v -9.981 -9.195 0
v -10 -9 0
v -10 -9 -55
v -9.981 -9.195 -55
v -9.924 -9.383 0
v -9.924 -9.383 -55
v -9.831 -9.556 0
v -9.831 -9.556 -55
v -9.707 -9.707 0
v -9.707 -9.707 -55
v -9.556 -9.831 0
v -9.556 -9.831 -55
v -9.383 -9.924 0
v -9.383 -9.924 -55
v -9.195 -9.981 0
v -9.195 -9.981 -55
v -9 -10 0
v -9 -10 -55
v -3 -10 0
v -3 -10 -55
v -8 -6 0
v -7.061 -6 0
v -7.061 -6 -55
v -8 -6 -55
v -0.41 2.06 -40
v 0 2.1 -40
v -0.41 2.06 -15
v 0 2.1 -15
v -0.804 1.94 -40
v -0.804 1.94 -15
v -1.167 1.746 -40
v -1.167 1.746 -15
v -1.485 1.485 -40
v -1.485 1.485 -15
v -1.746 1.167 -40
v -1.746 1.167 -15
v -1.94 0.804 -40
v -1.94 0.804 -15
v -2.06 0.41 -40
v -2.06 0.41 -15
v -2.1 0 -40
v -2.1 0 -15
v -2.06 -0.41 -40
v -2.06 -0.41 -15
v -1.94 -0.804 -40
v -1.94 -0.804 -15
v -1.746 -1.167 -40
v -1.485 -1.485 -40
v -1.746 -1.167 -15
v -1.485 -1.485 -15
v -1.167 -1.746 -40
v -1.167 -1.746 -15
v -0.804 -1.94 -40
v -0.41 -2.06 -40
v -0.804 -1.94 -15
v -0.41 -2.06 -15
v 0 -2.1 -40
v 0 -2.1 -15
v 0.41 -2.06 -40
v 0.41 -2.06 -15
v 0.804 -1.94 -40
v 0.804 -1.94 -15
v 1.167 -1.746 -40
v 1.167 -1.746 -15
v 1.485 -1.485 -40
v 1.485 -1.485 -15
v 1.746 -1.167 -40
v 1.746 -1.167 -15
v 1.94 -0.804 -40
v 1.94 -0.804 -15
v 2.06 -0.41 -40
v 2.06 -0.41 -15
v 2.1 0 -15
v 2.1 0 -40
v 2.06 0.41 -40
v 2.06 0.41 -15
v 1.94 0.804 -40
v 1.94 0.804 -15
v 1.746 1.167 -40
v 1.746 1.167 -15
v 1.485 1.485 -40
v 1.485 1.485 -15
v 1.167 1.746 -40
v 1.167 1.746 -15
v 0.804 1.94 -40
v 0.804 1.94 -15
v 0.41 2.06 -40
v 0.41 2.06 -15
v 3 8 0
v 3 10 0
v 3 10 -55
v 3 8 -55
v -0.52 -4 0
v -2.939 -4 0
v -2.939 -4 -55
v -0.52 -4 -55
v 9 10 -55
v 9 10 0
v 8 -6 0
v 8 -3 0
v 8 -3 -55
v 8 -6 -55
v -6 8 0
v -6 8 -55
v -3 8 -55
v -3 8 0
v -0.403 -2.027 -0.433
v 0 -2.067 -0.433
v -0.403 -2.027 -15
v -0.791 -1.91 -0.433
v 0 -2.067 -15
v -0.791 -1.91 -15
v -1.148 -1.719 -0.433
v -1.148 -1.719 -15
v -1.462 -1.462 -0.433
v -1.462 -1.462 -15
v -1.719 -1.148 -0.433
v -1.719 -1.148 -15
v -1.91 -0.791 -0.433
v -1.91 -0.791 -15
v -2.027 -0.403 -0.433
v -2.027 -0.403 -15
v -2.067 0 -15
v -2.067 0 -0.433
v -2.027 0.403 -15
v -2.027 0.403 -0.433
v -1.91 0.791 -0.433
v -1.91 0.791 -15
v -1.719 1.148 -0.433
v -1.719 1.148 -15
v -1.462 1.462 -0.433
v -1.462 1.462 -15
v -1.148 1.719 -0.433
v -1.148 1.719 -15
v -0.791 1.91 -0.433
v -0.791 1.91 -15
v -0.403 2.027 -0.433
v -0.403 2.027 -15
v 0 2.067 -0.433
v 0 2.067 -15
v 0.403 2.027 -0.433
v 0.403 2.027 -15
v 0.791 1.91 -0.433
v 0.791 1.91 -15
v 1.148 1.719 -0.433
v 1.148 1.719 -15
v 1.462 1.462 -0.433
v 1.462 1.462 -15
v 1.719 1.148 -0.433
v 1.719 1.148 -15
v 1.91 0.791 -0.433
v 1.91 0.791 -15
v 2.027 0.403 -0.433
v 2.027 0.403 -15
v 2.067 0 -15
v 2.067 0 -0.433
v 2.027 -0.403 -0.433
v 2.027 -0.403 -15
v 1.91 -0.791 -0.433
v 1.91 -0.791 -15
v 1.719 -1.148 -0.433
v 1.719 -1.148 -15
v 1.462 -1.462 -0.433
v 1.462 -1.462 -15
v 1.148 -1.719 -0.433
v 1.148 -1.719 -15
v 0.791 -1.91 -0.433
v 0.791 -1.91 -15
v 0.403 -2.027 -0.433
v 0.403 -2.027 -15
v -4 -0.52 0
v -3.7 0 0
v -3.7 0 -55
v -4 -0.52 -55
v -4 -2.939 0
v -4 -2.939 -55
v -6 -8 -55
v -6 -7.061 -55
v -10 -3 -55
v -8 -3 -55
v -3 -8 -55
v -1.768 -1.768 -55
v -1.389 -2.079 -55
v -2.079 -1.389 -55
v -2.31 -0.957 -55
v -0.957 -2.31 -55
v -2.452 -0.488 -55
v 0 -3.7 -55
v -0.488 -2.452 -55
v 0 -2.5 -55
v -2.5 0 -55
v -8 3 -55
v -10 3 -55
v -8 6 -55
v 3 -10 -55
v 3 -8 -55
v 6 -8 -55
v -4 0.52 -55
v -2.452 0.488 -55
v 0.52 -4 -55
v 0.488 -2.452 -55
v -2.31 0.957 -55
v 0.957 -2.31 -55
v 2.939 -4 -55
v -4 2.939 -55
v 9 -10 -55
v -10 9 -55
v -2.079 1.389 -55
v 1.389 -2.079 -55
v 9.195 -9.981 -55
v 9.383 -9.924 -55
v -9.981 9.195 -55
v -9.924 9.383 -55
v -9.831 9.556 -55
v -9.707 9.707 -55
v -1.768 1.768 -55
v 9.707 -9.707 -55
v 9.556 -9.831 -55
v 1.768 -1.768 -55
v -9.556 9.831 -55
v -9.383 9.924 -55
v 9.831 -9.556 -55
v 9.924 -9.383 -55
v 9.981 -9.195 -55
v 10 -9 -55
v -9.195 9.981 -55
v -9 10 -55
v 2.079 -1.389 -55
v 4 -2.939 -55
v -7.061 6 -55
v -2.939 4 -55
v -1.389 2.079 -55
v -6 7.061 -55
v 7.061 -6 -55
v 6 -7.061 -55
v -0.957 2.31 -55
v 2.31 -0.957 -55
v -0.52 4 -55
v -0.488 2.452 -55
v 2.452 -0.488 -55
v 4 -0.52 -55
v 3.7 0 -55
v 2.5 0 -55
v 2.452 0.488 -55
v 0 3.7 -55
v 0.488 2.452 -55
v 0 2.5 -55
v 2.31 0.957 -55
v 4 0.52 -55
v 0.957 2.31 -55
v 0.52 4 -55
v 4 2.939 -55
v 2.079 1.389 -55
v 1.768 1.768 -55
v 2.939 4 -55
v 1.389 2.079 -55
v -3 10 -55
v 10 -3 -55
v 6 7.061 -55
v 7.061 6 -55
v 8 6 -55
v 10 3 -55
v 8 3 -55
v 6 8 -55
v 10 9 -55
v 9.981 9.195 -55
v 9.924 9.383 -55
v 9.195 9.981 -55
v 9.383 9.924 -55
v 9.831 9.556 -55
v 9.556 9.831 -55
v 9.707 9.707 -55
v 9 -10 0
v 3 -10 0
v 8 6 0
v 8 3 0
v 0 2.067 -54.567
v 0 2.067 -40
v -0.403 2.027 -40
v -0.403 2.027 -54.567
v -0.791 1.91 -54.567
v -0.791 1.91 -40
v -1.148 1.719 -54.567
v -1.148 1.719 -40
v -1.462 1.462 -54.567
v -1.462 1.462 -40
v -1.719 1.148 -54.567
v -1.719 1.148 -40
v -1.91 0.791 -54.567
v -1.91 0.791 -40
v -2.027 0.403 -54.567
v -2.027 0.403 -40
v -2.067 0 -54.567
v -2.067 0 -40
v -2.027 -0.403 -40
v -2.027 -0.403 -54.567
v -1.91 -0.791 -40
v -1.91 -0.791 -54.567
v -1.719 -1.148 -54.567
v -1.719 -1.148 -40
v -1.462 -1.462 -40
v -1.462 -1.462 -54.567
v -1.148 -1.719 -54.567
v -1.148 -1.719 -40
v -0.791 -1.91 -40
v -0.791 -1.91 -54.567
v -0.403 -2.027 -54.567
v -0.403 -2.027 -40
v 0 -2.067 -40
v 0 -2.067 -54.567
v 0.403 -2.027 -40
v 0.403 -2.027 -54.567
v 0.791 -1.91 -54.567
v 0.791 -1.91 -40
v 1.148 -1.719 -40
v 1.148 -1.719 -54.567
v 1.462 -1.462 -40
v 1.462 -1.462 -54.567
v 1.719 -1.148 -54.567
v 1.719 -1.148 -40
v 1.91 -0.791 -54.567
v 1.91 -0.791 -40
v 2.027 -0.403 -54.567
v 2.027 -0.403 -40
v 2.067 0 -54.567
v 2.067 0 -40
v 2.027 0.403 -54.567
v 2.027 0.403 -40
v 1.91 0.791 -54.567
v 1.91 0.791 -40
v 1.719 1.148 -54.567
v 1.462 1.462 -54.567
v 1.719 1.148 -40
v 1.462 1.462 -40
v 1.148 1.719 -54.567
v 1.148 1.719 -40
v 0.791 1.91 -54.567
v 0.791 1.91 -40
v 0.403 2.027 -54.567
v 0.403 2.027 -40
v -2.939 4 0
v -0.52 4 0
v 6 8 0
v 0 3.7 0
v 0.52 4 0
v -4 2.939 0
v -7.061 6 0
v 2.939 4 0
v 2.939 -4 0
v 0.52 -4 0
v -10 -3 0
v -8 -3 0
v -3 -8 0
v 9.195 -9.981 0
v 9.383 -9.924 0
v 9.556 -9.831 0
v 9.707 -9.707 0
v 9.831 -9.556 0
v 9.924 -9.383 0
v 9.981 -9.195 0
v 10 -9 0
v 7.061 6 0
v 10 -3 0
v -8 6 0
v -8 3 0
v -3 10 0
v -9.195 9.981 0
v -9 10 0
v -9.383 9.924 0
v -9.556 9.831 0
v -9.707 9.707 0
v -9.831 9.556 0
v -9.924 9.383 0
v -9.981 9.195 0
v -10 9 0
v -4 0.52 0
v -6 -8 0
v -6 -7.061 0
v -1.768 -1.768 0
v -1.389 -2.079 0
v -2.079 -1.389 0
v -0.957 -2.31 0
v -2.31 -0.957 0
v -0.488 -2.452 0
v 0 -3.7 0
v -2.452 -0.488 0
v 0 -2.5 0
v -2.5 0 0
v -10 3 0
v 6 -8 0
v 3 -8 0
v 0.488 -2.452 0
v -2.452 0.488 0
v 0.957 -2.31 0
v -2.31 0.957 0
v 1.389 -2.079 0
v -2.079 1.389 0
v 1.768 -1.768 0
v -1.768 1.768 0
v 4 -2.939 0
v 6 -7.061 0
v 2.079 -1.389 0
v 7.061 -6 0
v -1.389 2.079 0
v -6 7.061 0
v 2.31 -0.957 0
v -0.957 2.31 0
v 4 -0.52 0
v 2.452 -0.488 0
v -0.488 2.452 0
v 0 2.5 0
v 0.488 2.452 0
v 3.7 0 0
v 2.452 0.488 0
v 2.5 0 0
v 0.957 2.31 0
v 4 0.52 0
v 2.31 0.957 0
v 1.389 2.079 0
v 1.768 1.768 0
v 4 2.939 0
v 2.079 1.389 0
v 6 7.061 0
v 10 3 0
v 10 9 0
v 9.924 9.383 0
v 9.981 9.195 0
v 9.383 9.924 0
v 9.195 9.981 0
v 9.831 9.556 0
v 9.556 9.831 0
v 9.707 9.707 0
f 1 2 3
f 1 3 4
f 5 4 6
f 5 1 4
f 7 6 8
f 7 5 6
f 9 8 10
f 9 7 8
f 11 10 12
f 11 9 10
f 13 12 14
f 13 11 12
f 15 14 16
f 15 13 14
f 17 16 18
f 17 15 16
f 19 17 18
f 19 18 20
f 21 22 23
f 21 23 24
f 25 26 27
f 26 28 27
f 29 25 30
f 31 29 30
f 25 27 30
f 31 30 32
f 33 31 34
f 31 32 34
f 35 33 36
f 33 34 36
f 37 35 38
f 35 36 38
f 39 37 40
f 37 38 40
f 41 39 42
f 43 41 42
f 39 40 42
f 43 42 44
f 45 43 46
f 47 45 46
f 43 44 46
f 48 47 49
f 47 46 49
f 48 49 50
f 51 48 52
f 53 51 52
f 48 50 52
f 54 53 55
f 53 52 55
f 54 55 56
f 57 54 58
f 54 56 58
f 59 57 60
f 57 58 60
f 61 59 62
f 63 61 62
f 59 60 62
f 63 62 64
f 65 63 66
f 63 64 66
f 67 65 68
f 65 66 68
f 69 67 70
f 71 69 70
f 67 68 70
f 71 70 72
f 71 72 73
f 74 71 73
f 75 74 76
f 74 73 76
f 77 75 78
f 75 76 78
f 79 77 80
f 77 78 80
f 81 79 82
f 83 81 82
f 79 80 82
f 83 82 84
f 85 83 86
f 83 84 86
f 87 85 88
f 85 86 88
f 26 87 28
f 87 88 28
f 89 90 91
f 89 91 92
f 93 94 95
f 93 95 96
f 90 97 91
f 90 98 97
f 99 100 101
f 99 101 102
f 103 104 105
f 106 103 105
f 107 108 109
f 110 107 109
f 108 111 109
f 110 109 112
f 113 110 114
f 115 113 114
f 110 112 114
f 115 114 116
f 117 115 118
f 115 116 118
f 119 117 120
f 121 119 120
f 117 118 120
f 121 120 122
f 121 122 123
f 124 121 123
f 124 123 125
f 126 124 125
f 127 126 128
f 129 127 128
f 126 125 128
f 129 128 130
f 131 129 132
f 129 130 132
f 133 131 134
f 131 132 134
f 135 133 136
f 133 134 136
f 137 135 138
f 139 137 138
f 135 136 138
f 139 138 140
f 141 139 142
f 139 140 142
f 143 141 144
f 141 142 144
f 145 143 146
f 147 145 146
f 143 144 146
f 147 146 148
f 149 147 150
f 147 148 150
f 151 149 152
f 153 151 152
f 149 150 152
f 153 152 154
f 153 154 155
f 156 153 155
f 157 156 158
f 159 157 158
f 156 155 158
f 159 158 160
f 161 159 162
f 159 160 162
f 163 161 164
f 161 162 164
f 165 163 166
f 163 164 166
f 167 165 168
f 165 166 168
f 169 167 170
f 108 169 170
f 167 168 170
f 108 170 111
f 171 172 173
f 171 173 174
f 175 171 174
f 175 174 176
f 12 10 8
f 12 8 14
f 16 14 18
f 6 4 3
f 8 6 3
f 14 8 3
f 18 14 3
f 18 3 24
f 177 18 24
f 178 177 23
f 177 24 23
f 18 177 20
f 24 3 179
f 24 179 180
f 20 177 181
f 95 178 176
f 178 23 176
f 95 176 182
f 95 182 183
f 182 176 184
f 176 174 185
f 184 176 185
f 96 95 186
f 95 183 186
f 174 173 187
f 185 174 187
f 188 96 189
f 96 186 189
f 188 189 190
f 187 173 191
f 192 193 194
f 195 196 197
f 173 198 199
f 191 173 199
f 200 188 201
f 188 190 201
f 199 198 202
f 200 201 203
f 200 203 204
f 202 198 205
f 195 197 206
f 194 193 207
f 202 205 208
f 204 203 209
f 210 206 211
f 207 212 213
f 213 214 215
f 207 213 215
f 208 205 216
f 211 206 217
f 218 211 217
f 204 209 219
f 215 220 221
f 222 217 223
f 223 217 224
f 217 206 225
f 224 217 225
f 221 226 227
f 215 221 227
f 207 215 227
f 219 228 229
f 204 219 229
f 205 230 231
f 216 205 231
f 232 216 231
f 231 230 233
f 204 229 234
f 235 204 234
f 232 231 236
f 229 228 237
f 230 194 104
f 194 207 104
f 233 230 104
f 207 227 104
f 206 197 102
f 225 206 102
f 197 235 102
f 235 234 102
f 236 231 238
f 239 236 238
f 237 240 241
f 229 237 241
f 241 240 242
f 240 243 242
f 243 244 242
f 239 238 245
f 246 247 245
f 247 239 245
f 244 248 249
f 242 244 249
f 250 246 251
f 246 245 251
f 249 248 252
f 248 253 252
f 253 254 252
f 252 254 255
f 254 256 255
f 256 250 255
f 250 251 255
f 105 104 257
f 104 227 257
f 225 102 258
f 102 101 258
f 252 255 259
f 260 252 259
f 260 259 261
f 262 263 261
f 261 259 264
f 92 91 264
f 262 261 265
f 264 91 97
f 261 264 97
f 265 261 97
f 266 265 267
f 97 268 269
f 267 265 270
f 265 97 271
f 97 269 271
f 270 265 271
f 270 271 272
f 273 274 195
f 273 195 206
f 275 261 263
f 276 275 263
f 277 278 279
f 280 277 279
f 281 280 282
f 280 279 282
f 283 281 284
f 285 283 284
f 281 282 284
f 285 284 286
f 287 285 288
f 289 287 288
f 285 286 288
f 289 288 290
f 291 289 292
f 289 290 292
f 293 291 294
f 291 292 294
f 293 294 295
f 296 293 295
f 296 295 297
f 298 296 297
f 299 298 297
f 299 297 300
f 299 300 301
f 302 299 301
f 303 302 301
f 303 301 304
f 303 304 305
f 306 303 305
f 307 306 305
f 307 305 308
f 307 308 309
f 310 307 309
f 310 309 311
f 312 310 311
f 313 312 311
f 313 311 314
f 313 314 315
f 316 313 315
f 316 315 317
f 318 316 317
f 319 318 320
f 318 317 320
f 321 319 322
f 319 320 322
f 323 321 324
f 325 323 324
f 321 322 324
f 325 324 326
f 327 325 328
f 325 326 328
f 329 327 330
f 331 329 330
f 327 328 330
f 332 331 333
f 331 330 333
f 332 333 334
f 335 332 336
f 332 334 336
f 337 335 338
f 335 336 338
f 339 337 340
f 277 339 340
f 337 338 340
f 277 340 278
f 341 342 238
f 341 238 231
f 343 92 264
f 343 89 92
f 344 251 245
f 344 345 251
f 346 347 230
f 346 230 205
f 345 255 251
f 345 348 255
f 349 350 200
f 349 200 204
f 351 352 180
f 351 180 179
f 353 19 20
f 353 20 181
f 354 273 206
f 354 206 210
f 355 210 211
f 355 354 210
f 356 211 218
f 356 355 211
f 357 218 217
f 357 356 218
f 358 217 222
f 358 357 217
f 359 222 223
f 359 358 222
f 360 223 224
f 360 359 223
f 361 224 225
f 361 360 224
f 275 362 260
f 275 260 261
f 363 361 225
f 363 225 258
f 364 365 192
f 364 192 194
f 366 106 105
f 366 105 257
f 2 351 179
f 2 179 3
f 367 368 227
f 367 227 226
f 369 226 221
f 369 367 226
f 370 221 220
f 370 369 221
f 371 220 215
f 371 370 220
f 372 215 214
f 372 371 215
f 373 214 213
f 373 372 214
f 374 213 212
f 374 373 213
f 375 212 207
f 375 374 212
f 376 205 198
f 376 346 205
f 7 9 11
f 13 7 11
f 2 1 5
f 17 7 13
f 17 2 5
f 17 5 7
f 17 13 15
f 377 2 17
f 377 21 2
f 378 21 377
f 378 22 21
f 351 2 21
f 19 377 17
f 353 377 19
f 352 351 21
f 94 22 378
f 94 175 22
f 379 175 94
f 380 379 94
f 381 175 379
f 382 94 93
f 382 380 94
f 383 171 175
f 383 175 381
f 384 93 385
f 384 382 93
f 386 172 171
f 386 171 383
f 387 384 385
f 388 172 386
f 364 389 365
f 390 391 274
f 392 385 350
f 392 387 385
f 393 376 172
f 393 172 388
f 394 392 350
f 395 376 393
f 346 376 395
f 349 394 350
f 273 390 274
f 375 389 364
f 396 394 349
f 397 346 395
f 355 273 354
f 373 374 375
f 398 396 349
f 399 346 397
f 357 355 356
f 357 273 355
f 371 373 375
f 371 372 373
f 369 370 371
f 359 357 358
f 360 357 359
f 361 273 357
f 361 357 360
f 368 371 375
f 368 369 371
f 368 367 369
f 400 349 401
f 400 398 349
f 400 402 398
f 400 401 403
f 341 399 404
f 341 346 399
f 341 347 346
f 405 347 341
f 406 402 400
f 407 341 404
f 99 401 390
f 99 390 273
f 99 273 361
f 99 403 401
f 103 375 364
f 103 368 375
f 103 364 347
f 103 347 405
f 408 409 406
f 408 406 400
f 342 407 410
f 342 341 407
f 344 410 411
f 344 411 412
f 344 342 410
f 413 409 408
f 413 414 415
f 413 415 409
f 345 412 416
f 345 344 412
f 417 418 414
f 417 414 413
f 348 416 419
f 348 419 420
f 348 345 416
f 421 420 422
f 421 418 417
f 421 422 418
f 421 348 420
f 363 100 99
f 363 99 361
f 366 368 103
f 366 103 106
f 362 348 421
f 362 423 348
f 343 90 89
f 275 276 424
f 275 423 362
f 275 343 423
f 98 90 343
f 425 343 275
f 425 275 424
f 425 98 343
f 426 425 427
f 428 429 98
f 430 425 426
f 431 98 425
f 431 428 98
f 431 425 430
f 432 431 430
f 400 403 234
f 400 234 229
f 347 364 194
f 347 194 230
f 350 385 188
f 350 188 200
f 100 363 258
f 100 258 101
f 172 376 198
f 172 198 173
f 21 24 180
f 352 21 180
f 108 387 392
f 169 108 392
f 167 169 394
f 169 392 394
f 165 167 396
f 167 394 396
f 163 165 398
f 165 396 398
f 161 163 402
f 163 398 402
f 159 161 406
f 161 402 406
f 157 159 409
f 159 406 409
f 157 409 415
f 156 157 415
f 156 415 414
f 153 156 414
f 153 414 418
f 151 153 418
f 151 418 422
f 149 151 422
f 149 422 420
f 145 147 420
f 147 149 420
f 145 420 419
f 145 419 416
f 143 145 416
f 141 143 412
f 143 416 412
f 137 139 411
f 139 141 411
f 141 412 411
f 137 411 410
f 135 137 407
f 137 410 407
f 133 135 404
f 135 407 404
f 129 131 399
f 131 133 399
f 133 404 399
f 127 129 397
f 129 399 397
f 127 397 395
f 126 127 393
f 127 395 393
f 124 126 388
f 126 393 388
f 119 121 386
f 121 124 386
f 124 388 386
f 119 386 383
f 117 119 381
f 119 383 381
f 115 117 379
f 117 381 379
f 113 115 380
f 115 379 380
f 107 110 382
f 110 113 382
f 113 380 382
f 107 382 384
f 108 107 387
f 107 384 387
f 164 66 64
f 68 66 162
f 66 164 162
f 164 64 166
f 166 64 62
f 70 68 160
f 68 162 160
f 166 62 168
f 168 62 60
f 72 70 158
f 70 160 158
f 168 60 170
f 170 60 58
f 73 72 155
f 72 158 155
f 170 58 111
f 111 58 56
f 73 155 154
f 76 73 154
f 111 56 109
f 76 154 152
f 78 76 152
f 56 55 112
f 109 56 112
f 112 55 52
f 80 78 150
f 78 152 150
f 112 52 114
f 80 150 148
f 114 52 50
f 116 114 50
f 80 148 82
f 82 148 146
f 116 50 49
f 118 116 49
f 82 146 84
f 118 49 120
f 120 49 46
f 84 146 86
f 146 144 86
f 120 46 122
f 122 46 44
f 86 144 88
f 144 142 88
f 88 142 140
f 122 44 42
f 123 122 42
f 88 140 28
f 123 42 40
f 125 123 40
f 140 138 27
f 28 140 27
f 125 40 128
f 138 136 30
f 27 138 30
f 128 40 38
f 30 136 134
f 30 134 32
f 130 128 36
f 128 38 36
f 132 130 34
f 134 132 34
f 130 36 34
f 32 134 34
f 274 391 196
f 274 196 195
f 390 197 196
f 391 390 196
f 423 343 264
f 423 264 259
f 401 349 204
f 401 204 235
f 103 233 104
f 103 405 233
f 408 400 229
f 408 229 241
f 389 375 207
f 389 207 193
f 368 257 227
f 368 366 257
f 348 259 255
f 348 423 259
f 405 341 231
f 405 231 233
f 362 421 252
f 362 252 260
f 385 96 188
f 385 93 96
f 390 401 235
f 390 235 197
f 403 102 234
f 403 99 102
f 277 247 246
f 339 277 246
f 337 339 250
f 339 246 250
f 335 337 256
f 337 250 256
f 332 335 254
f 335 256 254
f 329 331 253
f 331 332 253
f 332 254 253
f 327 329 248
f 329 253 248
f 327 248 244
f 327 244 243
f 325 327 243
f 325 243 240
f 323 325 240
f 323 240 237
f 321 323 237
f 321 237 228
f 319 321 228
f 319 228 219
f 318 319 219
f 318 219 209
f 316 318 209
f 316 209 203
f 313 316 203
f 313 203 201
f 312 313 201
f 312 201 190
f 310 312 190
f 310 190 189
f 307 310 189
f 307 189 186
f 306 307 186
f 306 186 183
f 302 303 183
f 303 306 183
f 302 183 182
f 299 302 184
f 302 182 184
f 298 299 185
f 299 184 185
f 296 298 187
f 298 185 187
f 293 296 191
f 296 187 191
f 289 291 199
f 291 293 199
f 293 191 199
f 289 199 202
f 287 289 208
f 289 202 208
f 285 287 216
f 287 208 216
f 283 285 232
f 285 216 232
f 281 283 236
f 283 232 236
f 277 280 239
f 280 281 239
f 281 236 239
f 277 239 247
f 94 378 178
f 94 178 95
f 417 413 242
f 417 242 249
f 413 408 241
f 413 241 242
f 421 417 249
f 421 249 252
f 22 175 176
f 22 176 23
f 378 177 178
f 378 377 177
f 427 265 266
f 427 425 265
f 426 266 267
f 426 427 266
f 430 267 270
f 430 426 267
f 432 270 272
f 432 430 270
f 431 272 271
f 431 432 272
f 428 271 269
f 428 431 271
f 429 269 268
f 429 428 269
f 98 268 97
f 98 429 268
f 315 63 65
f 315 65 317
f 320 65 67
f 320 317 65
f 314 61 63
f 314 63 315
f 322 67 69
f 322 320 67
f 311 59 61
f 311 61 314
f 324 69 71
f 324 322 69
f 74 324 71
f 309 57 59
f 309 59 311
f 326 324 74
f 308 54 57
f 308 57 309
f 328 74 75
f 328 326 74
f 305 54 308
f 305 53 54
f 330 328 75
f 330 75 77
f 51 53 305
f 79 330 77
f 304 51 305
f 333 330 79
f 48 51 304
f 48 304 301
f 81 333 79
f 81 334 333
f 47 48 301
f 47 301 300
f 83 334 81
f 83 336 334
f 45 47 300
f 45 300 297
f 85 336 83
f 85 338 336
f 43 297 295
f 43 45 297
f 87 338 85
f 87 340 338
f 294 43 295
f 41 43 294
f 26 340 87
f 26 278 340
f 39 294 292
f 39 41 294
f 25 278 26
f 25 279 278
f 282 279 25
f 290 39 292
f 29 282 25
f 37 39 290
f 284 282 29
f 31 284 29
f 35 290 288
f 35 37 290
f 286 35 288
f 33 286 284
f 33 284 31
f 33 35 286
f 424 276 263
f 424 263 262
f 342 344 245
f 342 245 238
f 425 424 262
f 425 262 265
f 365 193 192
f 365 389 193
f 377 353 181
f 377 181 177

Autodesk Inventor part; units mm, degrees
sketch "Sketch_1" plane through (0, 0, 0) normal (0, 0, 1) x (1, 0, 0)
  line L0 (-10, 3) -> (-8, 3)
  line L1 (-8, 3) -> (-8, 6)
  line L2 (-8, 6) -> (-7.0607, 6)
  line L3 (-7.0607, 6) -> (-4, 2.9393)
  line L4 (-4, 2.9393) -> (-4, 0.5196)
  line L5 (-4, 0.5196) -> (-3.7, 0)
  line L6 (-3.7, 0) -> (-4, -0.5196)
  line L7 (-4, -0.5196) -> (-4, -2.9393)
  line L8 (-4, -2.9393) -> (-7.0607, -6)
  line L9 (-7.0607, -6) -> (-8, -6)
  line L10 (-8, -6) -> (-8, -3)
  line L11 (-8, -3) -> (-10, -3)
  line L12 (-10, -3) -> (-10, -9)
  arc A0 (-10, -9) -> (-9, -10) centre (-9, -9) ccw
  line L13 (-9, -10) -> (-3, -10)
  line L14 (-3, -10) -> (-3, -8)
  line L15 (-3, -8) -> (-6, -8)
  line L16 (-6, -8) -> (-6, -7.0607)
  line L17 (-6, -7.0607) -> (-2.9393, -4)
  line L18 (-2.9393, -4) -> (-0.5196, -4)
  line L19 (-0.5196, -4) -> (0, -3.7)
  line L20 (0, -3.7) -> (0.5196, -4)
  line L21 (0.5196, -4) -> (2.9393, -4)
  line L22 (2.9393, -4) -> (6, -7.0607)
  line L23 (6, -7.0607) -> (6, -8)
  line L24 (6, -8) -> (3, -8)
  line L25 (3, -8) -> (3, -10)
  line L26 (3, -10) -> (9, -10)
  arc A1 (9, -10) -> (10, -9) centre (9, -9) ccw
  line L27 (10, -9) -> (10, -3)
  line L28 (10, -3) -> (8, -3)
  line L29 (8, -3) -> (8, -6)
  line L30 (8, -6) -> (7.0607, -6)
  line L31 (7.0607, -6) -> (4, -2.9393)
  line L32 (4, -2.9393) -> (4, -0.5196)
  line L33 (4, -0.5196) -> (3.7, 0)
  line L34 (3.7, 0) -> (4, 0.5196)
  line L35 (4, 0.5196) -> (4, 2.9393)
  line L36 (4, 2.9393) -> (7.0607, 6)
  line L37 (7.0607, 6) -> (8, 6)
  line L38 (8, 6) -> (8, 3)
  line L39 (8, 3) -> (10, 3)
  line L40 (10, 3) -> (10, 9)
  arc A2 (10, 9) -> (9, 10) centre (9, 9) ccw
  line L41 (9, 10) -> (3, 10)
  line L42 (3, 10) -> (3, 8)
  line L43 (3, 8) -> (6, 8)
  line L44 (6, 8) -> (6, 7.0607)
  line L45 (6, 7.0607) -> (2.9393, 4)
  line L46 (2.9393, 4) -> (0.5196, 4)
  line L47 (0.5196, 4) -> (0, 3.7)
  line L48 (0, 3.7) -> (-0.5196, 4)
  line L49 (-0.5196, 4) -> (-2.9393, 4)
  line L50 (-2.9393, 4) -> (-6, 7.0607)
  line L51 (-6, 7.0607) -> (-6, 8)
  line L52 (-6, 8) -> (-3, 8)
  line L53 (-3, 8) -> (-3, 10)
  line L54 (-3, 10) -> (-9, 10)
  arc A3 (-9, 10) -> (-10, 9) centre (-9, 9) ccw
  line L55 (-10, 9) -> (-10, 3)
extrude "Extrusion1" add sketch "Sketch_1" against normal blind 55
sketch "Sketch2" plane through (0, 0, 0) normal (0, 0, 1) x (1, 0, 0)
  point P0 (0, 0)
hole "Hole1" at (0, 0, 0) direction (0, 0, -1) diameter 4.134 depth 15 countersink diameter 5 countersink angle 90 thread size "M5x0.8" class "6H" standard "ISO Metric profile"
sketch "Sketch3" plane through (0, 0, -55) normal (0, 0, -1) x (-1, 0, 0)
  point P0 (0, 0)
hole "Hole2" at (0, 0, -55) direction (0, 0, 1) diameter 4.134 depth 15 countersink diameter 5 countersink angle 90 thread size "M5x0.8" class "6H" standard "ISO Metric profile"
sketch "Sketch4" plane through (0, 0, -40) normal (0, 0, -1) x (-1, 0, 0)
  point P0 (0, 0)
hole "Hole3" at (0, 0, -40) direction (0, 0, 1) diameter 4.2 depth 25
ref_plane "C1_XY" through (0, 0, 0) normal (0, 0, 1) x (1, 0, 0)
ref_plane "C1_YZ" through (0, 0, 0) normal (1, 0, 0) x (0, 1, 0)
ref_plane "C1_ZX" through (0, 0, 0) normal (0, 1, 0) x (0, 0, 1)
properties part number "HFSB5-2020-55-TPW"
